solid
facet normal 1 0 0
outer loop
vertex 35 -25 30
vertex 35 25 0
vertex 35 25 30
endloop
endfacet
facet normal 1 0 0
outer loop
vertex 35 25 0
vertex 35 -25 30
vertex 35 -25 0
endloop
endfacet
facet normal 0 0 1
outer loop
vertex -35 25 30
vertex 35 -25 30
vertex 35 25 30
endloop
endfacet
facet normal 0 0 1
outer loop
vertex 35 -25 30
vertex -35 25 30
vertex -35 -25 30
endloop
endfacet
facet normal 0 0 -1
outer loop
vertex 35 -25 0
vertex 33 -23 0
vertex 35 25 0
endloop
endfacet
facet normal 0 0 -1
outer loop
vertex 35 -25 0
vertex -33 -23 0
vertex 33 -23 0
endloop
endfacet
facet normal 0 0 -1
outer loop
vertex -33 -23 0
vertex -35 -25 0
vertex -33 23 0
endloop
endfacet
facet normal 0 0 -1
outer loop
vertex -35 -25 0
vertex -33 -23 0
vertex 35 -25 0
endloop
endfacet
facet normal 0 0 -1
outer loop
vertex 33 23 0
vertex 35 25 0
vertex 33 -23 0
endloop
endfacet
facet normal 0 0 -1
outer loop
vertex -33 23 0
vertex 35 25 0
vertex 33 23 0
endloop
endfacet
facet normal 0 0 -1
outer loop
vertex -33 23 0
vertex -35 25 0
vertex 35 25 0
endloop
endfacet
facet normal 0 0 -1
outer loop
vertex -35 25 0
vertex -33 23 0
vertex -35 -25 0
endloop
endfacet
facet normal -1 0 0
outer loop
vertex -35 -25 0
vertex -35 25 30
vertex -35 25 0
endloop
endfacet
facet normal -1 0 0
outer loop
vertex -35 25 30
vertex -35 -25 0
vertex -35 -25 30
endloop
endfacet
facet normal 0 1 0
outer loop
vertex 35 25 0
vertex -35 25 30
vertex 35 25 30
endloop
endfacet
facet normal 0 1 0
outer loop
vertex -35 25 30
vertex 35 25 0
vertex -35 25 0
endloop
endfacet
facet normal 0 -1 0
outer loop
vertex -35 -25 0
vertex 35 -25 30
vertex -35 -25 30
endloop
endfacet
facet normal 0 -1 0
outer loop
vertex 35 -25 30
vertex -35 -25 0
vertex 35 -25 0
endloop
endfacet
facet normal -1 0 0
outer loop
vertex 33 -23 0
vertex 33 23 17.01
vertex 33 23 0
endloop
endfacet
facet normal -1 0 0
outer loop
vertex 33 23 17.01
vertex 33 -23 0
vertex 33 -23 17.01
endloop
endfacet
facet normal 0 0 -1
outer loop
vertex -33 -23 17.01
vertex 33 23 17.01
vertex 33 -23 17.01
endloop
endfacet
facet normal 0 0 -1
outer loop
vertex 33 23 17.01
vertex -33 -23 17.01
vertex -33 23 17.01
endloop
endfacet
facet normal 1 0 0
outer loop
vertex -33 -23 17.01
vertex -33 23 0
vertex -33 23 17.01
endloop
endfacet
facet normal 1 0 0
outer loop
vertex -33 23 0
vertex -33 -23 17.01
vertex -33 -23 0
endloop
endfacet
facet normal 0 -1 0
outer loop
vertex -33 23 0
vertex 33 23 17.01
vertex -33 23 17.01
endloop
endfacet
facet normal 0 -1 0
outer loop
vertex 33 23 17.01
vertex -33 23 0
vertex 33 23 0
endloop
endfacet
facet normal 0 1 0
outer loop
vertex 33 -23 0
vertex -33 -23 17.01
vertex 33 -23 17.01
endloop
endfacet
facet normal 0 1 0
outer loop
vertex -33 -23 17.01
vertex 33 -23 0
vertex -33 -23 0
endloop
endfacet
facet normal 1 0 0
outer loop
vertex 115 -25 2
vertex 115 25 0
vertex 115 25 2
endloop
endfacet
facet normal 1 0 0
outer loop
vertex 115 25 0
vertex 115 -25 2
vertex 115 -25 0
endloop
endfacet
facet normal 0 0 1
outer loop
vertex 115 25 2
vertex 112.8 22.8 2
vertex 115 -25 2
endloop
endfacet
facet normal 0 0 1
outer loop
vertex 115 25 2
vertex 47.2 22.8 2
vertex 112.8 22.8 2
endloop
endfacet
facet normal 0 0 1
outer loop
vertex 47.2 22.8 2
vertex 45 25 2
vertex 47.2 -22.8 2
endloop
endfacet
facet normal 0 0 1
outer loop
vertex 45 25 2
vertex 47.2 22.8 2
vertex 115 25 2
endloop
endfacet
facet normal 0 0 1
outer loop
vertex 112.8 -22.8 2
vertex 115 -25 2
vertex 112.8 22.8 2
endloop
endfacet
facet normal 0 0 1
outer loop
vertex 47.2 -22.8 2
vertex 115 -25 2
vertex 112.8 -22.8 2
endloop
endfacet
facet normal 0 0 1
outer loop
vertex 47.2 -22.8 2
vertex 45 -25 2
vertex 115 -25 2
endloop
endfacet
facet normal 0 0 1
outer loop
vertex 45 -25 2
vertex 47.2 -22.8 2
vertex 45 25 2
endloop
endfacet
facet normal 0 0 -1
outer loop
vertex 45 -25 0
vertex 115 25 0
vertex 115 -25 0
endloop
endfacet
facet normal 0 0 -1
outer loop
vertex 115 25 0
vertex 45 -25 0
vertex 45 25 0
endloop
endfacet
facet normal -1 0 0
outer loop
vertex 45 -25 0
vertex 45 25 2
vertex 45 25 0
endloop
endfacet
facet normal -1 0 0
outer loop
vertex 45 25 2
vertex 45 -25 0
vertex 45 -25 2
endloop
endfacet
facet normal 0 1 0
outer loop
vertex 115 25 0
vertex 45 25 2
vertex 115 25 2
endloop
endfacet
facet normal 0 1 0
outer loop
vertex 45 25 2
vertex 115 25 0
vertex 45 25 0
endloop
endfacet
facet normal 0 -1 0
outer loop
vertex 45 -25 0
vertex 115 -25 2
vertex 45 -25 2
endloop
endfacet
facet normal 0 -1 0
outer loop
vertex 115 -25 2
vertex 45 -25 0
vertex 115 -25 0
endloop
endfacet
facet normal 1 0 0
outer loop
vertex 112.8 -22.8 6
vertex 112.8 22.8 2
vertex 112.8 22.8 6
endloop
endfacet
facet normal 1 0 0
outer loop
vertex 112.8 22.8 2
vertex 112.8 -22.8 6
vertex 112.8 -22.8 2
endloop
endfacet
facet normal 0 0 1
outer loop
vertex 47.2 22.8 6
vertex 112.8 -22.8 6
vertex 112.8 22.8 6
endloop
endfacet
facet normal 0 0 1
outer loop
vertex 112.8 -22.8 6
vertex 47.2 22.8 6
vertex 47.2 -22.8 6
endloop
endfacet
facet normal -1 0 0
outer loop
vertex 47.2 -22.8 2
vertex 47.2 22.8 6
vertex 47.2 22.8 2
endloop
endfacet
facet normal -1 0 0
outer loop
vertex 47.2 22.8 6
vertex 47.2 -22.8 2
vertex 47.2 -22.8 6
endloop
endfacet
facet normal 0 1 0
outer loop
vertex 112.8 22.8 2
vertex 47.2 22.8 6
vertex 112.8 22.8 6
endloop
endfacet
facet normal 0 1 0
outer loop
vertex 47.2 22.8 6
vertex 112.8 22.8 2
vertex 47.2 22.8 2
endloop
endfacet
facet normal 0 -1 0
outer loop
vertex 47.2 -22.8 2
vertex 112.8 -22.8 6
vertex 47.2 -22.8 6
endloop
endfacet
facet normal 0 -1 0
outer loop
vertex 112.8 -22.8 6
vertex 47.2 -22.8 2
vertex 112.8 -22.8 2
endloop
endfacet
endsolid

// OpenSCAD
// --- Dimensions ---
// Box Dimensions
box_width = 70;          // X dimension of box
box_depth = 50;          // Y dimension of box
box_height = 30;         // Z dimension of box
box_wall_thick = 2;      // Thickness of the walls
box_floor_thick = 2;     // Thickness of the bottom floor

// Lid Dimensions
lid_plate_w = 70;        // X dimension of the lid plate
lid_plate_d = 50;        // Y dimension of the lid plate
lid_plate_h = 2;         // Z dimension of the lid plate
lid_lip_thick = 1.5;     // Thickness of the lip wall
lid_lip_h = 4;           // Height of the lip wall
lid_lip_w = 65.6;        // X dimension of the lip (outer)
lid_lip_d = 45.6;        // Y dimension of the lip (outer)

// Layout
gap = 10;                // Gap between the two parts
$fn = 64;                // Smoothness for curves

// --- Part 1: The Box ---
// Requirement: Rests on the XY plane at z = 0 and builds upward (+Z).
// Requirement: Centered on X and Y.
// Box dimensions: 70x50x30.
// To ensure the bottom face is at Z=0, we translate the cube by +box_height/2.
translate([0, 0, box_height/2]) {
    difference() {
        // Main outer body
        cube([box_width, box_depth, box_height], center = true);
        
        // Hollow interior
        // We subtract a cube that is slightly larger in Z to ensure clean cut through top
        // The interior starts at Z = box_floor_thick and goes to box_height
        // To center the subtraction, we translate it to the center of the box
        // but offset it so the floor is 2mm thick.
        translate([0, 0, -box_height/2 + box_floor_thick + 0.01])
            cube([box_width - 2*box_wall_thick, box_depth - 2*box_wall_thick, box_height], center = true);
    }
}

// --- Part 2: The Lid ---
// Requirement: Printed upside down: a plate 70 x 50 x 2 mm lying on the bed, 
// with a rectangular lip on top of it.
// Requirement: Place the lid on the +X side of the box.
// Requirement: Rests on the XY plane at z = 0.

// Calculation for X position:
// Box X range is [-35, 35].
// Gap is 10.
// Lid X range starts at 35 + 10 = 45.
// Lid X center is 45 + (70/2) = 80.
translate([box_width/2 + gap + lid_plate_w/2, 0, 0]) {
    // The lid is built from the bed up.
    // Plate is at Z=0.
    union() {
        // The base plate (lying on the bed)
        // To rest on Z=0, we translate the cube by +lid_plate_h/2
        translate([0, 0, lid_plate_h/2])
            cube([lid_plate_w, lid_plate_d, lid_plate_h], center = true);
        
        // The Lip (on top of the plate)
        // The lip sits on the plate, so its base is at Z = lid_plate_h.
        // To center it on Z, we translate to lid_plate_h + lid_lip_h/2.
        translate([0, 0, lid_plate_h + lid_lip_h/2])
            cube([lid_lip_w, lid_lip_d, lid_lip_h], center = true);
    }
}
